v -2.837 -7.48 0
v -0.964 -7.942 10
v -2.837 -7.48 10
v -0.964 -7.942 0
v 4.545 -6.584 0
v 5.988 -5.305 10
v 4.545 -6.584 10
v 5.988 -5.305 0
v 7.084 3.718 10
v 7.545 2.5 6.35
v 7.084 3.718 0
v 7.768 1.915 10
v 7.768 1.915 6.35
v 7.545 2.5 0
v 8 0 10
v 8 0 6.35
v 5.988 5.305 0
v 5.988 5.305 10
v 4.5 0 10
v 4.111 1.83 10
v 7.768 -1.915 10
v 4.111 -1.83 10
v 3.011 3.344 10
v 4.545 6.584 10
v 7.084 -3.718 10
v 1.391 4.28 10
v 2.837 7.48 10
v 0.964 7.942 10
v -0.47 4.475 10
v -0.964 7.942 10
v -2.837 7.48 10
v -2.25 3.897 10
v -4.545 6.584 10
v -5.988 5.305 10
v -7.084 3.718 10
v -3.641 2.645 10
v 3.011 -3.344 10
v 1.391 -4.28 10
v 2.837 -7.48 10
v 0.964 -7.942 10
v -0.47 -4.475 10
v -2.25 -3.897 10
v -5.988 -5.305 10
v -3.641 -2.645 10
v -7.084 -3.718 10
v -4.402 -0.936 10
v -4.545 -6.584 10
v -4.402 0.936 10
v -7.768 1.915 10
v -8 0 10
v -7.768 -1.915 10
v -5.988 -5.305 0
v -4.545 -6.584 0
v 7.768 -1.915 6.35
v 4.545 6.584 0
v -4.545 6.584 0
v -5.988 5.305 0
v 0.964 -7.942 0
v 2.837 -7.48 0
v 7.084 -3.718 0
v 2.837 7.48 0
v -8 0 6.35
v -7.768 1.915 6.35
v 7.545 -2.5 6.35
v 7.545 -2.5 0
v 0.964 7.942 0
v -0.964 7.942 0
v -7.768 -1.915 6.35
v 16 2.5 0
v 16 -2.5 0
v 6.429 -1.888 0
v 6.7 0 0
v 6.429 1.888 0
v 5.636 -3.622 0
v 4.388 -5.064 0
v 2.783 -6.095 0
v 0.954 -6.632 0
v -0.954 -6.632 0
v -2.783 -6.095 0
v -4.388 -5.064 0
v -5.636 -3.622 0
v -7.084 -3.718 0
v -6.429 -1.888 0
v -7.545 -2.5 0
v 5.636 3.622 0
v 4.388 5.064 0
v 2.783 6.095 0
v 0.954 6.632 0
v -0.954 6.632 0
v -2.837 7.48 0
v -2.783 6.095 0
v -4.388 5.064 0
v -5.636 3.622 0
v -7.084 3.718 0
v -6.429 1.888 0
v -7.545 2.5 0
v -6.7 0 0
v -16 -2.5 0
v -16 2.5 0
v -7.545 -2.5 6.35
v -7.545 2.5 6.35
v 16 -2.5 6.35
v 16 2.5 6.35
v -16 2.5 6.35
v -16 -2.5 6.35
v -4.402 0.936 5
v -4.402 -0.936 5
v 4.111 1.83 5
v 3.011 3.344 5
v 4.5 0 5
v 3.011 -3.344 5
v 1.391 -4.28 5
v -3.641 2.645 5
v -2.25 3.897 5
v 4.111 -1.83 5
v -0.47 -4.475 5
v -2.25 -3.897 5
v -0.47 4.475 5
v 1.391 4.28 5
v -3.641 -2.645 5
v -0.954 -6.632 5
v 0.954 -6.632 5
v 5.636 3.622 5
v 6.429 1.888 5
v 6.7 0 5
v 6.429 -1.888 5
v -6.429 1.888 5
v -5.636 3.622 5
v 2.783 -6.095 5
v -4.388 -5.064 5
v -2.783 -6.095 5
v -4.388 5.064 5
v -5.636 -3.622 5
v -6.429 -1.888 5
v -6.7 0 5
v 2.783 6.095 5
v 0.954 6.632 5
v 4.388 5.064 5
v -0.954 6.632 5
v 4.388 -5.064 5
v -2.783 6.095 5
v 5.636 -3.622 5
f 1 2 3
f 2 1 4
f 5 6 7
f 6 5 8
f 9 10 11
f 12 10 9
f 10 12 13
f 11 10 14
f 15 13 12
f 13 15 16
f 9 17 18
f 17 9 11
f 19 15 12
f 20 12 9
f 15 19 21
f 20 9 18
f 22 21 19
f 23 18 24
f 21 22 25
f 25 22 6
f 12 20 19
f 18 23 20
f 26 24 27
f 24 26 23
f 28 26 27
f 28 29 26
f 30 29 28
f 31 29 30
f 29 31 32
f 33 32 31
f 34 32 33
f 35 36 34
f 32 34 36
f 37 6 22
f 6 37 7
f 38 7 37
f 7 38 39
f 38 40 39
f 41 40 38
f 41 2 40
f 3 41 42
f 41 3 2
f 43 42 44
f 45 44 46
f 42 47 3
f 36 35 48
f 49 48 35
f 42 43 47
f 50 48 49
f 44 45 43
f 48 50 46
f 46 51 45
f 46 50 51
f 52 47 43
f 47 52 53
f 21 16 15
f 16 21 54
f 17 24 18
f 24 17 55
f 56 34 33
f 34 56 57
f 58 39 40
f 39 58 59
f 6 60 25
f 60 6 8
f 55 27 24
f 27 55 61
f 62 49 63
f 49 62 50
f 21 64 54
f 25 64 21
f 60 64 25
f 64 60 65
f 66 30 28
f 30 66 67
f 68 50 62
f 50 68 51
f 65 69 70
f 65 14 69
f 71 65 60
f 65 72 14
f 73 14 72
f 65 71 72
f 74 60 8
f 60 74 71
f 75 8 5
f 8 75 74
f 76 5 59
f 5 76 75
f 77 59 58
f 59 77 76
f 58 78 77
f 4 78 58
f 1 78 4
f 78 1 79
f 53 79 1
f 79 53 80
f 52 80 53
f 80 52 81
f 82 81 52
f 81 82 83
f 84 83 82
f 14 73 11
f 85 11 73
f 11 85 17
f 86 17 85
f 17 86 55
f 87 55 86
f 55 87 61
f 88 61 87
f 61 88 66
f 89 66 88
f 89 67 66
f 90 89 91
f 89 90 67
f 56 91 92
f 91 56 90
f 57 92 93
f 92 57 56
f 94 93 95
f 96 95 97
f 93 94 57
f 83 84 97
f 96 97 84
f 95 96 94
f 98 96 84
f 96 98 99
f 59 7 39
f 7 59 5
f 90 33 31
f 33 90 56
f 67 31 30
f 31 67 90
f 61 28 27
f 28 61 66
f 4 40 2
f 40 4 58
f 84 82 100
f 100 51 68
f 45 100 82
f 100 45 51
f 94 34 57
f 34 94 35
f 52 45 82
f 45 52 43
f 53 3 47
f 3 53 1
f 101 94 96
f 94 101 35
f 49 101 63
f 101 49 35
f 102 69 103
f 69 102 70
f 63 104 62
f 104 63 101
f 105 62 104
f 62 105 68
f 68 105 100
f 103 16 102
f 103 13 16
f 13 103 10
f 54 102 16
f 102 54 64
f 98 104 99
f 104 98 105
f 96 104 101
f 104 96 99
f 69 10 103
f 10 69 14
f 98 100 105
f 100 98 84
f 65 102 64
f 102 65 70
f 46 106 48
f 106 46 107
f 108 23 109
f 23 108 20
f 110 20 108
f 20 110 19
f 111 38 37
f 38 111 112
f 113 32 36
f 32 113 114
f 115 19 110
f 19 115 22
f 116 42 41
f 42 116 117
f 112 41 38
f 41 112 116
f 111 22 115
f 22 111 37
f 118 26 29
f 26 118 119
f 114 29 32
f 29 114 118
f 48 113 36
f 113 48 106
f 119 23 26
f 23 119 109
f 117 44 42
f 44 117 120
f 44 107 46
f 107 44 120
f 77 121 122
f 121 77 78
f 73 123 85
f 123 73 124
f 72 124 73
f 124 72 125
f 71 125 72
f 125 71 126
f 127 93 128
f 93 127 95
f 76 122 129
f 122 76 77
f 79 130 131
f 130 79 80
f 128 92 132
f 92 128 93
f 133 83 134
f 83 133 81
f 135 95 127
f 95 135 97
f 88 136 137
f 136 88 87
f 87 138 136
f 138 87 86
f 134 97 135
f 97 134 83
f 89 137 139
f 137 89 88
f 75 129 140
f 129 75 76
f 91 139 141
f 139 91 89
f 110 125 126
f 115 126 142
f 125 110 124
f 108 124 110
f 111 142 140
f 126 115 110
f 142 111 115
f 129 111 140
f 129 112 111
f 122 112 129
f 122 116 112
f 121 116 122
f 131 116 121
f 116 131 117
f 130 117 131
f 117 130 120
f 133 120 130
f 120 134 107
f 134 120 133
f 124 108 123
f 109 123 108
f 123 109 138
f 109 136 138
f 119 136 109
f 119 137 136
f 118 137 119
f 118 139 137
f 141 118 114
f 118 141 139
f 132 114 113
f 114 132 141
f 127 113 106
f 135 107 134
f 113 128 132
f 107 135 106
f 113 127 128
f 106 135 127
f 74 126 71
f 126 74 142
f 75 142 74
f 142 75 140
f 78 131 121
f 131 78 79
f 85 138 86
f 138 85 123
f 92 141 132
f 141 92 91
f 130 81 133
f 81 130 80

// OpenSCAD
//include <bearing.scad>;
//include <screw.scad>;

profileWidth = 20;
screwSpace = 15;
thickness = 10;

mainBoreDiameter = 16;
mainBoreRadius = mainBoreDiameter/2;

axisDiameter = 9;
axisRadius = axisDiameter/2;

profileHeight=20;
slotWidth=5;
slotHeight=6.35;


difference () {
	getMain();
//	translate([0,0,0])bearing(model=625);
//	translate([0,0,2])bearing(model=625);
//	translate([0,0,0])cylinder(h=5,r=8.2);
//	translate([(profileWidth+screwSpace)/2,0,-10])m5Screw();
//	translate([-(profileWidth+screwSpace)/2,0,-10])m5Screw();
//	translate([0,0,-thickness/2])cylinder(h=thickness*2,r=4);
}
module getMain() {
	difference() {
		union() {
//			translate([0,0,1.75])
			cylinder(h=profileHeight/2,r=mainBoreRadius);
			translate([-(mainBoreDiameter*2)/2,-slotWidth/2,0])cube([mainBoreDiameter*2,slotWidth,slotHeight]);
		}
		axis();
//		#translate([0,0,13])
		#bearing();
	}
}

module axis() {
	cylinder(h=profileHeight,r=axisRadius);
}

module bearing() {
	cylinder(h=5,r=13.4/2);
}


module m5Screw() {
	union() {
		cylinder(h=10,r=2.5);
		translate([0,0,10])cylinder(h=5,r=4.25);
	}
}
